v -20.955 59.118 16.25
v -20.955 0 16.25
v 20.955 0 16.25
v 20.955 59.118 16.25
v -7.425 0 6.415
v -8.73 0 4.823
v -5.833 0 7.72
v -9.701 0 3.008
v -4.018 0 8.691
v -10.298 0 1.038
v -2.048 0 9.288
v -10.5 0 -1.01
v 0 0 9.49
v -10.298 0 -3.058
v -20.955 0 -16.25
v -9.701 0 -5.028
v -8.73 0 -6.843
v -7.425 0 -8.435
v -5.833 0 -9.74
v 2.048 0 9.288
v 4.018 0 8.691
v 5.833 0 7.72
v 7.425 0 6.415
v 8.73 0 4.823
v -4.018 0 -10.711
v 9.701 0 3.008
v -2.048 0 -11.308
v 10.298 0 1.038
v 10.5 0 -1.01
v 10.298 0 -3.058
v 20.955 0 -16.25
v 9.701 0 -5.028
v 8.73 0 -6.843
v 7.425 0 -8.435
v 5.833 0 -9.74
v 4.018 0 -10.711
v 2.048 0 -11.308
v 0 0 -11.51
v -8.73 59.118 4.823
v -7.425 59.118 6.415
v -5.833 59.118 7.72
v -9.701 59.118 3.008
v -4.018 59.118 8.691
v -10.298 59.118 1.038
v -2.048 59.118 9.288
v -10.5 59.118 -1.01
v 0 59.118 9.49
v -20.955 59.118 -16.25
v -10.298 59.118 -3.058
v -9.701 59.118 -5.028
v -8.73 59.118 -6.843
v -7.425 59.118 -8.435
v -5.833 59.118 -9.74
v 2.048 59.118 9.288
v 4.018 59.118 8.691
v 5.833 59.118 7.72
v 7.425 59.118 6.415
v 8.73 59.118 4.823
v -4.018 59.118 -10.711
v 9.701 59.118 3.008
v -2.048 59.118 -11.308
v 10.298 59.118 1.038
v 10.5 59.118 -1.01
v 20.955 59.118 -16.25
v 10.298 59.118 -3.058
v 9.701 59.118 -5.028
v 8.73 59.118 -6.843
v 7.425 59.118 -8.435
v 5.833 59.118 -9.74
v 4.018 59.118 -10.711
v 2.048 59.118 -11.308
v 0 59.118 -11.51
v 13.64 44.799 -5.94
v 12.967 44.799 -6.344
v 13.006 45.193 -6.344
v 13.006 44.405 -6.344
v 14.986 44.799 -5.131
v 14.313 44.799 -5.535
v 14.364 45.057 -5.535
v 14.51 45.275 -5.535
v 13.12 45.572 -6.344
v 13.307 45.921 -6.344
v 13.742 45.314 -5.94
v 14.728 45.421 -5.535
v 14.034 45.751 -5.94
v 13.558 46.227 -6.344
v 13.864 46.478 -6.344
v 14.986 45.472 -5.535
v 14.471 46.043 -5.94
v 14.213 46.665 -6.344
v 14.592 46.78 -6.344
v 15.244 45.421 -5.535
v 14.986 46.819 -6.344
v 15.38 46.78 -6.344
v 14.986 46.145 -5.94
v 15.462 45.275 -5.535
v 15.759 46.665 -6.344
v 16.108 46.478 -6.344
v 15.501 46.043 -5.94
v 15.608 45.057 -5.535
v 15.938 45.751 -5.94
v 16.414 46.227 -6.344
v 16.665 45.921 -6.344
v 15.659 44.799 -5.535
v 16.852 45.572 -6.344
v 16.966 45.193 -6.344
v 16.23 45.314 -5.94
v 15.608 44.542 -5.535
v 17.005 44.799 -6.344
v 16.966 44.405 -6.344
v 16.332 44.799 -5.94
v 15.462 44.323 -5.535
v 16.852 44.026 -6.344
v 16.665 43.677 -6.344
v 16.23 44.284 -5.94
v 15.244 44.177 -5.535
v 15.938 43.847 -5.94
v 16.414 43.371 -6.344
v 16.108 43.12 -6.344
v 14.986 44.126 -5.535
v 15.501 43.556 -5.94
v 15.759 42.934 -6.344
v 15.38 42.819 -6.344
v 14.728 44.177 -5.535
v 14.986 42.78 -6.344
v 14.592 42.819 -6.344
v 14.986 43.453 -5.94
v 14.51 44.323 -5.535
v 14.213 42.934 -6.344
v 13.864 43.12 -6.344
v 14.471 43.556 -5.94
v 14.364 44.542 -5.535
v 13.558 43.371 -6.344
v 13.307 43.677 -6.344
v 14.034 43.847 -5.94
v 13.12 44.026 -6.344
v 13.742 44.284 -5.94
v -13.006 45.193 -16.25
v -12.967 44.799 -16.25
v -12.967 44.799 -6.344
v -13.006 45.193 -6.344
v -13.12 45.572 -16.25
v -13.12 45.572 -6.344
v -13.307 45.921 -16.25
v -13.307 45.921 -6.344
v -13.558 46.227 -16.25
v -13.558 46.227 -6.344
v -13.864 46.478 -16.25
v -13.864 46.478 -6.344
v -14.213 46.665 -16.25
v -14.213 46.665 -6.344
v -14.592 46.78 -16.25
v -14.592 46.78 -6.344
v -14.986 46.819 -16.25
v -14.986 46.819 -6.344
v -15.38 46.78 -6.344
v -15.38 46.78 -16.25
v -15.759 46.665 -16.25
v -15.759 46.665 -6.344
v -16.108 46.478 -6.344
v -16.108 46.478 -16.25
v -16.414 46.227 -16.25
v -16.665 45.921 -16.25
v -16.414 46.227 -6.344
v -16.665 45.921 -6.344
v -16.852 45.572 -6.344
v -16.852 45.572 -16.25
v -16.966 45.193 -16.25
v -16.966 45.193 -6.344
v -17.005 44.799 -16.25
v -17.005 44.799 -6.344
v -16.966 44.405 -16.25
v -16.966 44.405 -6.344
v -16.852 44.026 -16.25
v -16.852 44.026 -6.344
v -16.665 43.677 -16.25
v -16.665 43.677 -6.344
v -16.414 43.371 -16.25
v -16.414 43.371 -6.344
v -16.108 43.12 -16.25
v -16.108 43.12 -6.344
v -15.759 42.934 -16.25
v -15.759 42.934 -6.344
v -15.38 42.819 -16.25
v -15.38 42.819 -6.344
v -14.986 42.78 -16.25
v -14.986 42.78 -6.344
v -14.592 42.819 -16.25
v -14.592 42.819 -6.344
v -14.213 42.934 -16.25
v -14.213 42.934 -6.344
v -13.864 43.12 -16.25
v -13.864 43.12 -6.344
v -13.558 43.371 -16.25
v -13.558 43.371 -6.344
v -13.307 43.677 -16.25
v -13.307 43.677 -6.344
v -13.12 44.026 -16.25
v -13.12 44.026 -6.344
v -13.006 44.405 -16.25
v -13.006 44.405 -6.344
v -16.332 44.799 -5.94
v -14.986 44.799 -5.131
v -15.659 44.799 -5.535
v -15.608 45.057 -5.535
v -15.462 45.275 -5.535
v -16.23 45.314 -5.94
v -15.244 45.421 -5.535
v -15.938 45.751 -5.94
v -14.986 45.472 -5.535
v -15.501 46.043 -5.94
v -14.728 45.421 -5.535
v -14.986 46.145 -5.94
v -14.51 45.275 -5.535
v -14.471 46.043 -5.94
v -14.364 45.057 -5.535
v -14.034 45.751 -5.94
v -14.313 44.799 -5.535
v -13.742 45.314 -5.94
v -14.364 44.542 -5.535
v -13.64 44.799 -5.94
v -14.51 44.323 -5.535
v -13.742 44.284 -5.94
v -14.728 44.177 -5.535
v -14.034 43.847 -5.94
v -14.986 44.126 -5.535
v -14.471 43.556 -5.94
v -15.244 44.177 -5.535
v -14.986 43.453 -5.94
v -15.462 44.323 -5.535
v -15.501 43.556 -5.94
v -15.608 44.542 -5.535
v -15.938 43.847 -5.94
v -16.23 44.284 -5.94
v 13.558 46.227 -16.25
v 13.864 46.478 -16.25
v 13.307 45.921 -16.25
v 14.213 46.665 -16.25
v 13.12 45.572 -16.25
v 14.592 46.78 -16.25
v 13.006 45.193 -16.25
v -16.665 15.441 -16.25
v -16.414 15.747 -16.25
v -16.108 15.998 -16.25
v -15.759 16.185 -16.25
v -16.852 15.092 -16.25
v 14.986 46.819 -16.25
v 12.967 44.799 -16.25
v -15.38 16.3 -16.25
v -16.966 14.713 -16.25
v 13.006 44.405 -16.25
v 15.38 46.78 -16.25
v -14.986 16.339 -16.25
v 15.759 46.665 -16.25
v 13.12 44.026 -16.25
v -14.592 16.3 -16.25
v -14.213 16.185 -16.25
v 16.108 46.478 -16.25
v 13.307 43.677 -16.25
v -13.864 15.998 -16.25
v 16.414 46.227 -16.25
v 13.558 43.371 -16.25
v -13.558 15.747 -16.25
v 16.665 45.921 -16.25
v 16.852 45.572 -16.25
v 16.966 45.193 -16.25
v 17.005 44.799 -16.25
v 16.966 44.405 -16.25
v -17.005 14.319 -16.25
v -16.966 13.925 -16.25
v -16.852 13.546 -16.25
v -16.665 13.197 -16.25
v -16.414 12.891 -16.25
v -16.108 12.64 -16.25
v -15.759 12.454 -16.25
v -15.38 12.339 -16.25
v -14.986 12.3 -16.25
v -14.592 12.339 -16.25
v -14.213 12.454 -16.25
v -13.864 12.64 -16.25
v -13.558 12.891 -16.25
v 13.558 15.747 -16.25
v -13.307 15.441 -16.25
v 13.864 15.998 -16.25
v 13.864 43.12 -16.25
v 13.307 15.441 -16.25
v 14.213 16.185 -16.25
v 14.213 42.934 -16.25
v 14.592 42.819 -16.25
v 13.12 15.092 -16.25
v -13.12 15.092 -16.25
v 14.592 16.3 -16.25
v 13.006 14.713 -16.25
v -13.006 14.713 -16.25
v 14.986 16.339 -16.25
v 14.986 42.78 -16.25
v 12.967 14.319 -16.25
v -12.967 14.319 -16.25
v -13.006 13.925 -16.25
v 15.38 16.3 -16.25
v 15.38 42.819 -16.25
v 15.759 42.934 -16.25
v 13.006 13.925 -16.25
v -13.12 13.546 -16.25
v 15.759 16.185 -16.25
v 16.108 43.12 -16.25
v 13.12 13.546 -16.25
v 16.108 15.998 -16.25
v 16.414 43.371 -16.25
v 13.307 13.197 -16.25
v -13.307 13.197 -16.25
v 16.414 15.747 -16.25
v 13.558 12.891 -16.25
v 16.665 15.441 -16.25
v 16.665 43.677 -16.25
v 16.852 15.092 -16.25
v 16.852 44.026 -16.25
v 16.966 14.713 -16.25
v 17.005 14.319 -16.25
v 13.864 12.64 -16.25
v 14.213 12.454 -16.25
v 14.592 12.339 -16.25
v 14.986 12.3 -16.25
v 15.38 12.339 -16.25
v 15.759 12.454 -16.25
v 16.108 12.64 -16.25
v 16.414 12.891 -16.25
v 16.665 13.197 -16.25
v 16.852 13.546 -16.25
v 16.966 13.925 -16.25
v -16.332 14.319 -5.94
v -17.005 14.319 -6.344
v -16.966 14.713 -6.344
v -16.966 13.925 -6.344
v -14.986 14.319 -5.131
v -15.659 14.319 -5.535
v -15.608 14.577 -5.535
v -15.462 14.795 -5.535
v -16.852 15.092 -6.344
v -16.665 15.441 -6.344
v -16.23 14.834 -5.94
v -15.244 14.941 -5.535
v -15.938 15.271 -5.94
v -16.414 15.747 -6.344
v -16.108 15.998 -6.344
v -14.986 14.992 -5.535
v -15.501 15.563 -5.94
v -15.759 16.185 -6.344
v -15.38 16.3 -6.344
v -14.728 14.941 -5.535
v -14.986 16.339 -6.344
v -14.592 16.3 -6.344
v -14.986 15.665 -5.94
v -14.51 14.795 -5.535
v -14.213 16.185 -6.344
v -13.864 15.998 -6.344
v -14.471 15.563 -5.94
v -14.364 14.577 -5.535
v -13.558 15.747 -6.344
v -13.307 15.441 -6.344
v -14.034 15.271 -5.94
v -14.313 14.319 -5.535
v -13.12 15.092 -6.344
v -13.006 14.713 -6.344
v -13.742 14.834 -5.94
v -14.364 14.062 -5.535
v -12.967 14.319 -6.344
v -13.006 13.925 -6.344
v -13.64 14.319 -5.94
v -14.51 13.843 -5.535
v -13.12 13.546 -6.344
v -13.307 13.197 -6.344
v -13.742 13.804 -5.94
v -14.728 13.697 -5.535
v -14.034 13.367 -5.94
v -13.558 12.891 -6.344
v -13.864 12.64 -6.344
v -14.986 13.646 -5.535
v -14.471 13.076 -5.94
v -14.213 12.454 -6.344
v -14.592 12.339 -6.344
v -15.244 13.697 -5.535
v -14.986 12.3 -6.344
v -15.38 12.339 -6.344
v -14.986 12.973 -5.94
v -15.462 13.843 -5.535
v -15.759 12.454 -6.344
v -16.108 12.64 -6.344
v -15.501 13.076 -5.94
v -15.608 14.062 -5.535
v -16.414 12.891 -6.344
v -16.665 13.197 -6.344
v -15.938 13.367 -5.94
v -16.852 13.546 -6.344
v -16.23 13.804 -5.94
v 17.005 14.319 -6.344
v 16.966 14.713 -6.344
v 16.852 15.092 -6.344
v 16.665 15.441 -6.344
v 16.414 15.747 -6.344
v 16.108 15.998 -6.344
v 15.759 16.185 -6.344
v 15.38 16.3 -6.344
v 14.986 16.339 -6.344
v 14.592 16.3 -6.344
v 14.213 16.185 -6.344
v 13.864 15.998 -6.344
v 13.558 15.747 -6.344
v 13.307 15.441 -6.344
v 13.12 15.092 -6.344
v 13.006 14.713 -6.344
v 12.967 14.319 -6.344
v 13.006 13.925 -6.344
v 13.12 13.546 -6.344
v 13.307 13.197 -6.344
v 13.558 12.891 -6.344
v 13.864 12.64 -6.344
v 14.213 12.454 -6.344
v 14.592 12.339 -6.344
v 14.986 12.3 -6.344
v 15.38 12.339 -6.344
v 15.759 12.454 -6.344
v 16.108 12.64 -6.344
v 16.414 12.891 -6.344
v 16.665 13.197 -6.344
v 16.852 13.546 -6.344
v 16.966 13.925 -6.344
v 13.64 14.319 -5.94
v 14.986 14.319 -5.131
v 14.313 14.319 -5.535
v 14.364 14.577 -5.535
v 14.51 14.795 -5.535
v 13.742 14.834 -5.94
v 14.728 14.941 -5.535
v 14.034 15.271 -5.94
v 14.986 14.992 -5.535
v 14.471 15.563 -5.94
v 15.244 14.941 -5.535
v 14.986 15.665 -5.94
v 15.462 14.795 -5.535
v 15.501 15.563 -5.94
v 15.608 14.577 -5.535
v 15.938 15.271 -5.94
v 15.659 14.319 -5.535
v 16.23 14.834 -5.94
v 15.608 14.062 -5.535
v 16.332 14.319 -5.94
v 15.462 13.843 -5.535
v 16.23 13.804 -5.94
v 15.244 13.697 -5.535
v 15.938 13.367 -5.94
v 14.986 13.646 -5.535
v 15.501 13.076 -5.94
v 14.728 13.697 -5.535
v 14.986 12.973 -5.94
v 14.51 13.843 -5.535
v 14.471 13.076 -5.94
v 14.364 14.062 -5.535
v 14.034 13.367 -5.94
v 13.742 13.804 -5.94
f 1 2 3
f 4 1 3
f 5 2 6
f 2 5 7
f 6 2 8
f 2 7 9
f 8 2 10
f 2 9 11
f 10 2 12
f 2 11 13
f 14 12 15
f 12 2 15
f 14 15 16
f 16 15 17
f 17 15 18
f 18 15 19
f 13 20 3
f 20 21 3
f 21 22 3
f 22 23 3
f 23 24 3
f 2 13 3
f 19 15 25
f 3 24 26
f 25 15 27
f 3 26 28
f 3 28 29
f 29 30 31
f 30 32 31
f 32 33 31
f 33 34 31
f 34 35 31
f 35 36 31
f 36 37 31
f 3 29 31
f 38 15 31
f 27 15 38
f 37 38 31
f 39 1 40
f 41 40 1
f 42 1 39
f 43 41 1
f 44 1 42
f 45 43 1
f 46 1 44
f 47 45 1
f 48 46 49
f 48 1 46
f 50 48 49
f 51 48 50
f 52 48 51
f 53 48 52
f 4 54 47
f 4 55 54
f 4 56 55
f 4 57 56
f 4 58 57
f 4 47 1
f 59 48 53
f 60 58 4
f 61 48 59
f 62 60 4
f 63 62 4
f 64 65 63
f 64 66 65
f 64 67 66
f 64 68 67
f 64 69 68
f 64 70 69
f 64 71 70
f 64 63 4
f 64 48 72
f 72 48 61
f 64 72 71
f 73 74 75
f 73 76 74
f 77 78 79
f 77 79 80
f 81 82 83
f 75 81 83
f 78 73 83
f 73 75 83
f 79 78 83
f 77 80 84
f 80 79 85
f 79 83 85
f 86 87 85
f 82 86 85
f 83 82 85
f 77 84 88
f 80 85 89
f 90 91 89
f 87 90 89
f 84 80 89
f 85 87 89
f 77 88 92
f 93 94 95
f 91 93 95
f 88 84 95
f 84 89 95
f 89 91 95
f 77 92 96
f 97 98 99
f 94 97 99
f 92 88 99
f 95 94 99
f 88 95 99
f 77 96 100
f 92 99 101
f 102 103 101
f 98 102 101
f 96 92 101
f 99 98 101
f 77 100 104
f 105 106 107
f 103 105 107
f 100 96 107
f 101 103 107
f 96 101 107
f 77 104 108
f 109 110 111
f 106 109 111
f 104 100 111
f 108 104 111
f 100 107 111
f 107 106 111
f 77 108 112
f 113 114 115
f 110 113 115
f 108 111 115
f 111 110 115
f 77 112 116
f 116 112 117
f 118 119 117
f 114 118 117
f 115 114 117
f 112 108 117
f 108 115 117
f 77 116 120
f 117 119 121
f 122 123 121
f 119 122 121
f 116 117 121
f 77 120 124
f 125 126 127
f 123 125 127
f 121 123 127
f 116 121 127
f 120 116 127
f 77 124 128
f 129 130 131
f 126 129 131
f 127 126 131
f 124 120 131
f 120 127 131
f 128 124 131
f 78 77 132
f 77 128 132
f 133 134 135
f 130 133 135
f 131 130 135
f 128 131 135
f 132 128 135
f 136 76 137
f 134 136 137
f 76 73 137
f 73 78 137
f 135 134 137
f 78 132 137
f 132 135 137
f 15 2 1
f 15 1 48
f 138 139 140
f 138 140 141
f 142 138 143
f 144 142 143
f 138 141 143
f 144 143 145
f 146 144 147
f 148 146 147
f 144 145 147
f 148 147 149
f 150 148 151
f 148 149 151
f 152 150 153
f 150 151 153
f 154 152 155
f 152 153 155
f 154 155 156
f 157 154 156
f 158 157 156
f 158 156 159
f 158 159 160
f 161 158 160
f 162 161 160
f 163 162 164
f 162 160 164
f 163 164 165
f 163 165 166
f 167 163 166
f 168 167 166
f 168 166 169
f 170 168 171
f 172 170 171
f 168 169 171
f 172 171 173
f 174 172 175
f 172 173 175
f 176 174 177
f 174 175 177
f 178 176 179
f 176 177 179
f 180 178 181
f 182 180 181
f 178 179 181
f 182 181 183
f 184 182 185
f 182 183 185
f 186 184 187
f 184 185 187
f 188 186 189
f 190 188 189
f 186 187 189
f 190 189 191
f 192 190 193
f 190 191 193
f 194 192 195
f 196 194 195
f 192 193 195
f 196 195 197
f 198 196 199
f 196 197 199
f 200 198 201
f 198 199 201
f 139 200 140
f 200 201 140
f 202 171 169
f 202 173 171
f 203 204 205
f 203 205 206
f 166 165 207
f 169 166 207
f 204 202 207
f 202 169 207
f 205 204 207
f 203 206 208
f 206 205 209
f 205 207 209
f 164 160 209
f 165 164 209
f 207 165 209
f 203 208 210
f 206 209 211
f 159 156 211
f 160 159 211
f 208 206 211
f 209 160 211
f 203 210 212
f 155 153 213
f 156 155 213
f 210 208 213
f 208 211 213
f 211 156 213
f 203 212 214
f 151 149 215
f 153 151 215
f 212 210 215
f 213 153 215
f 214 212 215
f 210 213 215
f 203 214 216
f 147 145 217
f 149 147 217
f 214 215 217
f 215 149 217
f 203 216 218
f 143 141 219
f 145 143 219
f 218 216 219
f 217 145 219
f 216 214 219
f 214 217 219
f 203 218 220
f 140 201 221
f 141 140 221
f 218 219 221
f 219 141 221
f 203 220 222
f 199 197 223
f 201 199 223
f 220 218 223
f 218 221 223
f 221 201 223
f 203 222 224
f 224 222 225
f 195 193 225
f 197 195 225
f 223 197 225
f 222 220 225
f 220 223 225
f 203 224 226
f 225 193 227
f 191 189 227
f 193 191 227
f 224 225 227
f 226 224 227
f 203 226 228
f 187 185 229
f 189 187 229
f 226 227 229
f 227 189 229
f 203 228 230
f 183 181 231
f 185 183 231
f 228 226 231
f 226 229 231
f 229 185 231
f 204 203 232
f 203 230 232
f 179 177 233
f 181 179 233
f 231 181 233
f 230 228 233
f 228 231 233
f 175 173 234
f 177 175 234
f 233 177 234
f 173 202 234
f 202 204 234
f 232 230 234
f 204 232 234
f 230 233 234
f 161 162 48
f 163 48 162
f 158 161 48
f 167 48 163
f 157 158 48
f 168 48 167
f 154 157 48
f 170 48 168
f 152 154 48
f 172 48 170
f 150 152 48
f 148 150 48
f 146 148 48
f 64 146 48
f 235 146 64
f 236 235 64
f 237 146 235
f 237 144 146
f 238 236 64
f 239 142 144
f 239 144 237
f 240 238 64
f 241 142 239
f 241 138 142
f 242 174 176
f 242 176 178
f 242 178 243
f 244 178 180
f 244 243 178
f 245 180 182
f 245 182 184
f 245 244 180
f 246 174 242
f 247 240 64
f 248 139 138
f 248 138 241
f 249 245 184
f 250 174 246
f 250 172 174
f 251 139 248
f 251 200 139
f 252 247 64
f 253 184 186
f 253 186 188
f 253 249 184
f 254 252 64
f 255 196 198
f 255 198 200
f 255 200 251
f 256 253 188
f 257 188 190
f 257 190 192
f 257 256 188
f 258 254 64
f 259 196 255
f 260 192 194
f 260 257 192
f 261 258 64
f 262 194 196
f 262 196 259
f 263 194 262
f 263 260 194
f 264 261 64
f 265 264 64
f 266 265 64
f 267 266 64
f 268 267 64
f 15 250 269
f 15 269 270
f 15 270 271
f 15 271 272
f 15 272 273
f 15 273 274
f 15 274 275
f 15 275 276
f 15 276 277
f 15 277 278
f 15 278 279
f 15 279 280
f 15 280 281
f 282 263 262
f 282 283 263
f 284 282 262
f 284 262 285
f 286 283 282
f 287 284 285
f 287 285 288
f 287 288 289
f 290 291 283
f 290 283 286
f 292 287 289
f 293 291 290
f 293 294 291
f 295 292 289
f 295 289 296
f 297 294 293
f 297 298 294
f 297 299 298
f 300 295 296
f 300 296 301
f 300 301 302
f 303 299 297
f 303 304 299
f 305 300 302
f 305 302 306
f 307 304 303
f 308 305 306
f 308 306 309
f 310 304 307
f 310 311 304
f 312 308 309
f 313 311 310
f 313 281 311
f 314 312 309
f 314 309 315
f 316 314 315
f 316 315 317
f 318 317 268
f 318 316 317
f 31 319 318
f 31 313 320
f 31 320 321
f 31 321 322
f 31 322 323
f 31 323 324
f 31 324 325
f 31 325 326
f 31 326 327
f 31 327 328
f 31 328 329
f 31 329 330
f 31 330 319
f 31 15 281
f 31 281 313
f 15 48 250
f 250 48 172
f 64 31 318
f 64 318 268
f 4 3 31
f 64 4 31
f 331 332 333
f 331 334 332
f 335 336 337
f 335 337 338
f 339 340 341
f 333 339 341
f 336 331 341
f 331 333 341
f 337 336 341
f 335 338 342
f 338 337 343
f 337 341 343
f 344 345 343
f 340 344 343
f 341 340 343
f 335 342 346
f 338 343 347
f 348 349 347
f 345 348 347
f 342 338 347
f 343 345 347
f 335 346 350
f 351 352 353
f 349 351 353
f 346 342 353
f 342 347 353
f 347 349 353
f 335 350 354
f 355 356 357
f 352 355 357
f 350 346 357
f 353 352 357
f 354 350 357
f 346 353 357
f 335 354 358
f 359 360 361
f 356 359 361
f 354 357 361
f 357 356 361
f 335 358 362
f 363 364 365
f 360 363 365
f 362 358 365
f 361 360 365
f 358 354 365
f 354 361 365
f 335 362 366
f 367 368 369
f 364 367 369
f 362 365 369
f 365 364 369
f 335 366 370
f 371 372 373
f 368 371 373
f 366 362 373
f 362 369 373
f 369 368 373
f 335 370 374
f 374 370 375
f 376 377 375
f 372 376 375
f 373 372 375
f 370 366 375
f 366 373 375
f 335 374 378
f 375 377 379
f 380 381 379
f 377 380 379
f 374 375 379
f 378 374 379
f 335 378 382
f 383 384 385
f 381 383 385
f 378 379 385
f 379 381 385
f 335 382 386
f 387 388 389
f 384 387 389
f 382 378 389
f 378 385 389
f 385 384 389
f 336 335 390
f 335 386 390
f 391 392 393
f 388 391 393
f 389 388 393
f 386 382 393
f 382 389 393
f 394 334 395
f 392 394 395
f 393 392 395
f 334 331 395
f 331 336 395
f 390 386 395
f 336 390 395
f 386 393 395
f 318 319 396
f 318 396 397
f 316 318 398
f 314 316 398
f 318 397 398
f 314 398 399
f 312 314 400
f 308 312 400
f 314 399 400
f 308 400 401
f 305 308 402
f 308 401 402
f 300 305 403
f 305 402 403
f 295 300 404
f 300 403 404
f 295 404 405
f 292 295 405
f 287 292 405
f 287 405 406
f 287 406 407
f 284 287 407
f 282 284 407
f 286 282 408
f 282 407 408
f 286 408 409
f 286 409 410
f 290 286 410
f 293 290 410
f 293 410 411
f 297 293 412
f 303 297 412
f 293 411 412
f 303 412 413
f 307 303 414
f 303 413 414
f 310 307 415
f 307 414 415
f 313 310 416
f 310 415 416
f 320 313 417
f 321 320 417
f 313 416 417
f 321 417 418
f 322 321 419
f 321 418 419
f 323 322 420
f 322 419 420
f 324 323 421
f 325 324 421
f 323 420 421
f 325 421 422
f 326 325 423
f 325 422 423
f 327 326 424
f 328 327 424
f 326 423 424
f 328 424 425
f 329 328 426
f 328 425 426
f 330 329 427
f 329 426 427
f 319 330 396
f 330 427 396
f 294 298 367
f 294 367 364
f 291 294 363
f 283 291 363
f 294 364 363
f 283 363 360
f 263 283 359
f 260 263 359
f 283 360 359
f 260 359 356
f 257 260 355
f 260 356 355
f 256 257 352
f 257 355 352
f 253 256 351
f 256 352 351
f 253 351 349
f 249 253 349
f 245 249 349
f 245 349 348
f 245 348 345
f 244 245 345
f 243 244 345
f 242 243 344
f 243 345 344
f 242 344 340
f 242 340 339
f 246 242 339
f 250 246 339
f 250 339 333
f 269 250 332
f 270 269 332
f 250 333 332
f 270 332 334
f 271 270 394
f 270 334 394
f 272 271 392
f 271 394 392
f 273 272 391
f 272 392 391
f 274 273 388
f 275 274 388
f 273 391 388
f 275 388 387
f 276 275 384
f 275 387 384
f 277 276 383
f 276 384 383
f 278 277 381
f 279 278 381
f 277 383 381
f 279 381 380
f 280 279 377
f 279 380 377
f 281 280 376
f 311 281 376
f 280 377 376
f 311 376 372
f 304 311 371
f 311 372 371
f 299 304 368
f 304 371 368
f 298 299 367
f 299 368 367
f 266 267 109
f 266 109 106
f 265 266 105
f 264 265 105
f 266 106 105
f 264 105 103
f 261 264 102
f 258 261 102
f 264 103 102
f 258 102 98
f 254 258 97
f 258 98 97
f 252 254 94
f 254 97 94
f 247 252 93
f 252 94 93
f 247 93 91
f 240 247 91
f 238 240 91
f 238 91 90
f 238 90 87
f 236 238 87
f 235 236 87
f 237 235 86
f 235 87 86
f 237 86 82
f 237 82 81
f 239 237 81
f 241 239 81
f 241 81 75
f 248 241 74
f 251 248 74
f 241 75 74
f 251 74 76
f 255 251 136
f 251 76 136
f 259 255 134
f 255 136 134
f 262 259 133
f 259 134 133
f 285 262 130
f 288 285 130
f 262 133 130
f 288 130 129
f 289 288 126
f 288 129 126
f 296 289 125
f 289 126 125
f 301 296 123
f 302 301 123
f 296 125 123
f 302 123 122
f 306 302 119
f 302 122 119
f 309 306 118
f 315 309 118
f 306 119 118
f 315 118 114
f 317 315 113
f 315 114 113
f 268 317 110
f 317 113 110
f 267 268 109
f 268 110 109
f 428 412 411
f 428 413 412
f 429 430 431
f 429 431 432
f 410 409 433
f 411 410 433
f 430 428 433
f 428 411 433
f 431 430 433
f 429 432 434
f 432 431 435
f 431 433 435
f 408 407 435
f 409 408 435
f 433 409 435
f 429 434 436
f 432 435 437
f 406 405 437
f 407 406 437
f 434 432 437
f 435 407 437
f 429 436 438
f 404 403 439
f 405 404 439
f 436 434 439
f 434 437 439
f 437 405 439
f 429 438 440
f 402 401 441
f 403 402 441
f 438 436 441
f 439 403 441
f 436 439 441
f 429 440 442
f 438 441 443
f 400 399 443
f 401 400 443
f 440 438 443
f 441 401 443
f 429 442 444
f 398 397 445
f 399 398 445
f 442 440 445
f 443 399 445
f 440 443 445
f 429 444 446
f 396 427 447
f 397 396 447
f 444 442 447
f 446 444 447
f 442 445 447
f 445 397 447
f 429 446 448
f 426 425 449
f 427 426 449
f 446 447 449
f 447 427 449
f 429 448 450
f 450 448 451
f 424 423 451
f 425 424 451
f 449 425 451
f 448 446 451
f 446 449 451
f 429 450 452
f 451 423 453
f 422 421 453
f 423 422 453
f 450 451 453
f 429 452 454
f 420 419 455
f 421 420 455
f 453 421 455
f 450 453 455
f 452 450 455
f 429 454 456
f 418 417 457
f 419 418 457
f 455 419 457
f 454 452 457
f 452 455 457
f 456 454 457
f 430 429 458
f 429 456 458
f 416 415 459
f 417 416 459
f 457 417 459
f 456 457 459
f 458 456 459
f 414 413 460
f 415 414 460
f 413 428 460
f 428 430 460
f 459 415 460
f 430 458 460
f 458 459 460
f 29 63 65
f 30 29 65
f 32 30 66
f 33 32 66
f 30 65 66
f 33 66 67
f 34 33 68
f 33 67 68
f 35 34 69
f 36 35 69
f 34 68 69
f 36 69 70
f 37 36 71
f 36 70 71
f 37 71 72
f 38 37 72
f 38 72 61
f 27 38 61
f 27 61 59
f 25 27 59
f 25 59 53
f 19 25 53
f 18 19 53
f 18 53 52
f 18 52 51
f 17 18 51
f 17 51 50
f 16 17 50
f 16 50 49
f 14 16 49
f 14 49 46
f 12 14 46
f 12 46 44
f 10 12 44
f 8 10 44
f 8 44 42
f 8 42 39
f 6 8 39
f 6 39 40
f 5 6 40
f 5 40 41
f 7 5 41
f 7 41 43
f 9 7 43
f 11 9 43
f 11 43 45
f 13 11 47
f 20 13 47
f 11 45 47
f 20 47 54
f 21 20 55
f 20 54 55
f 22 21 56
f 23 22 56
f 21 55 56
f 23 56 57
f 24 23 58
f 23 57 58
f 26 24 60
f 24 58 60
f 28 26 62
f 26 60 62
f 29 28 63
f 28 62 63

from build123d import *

# Parameters (mm, degrees)
SKETCH1_W                  = 41.91
SKETCH1_H                  = 32.5
BOSS_EXTRUDE1_DEPTH        = 59.1185
SKETCH2_R                  = 10.5
CUT_EXTRUDE1_DEPTH         = 60.1185
F_10_32_TAPPED_HOLE1_D     = 4.0386
F_10_32_TAPPED_HOLE1_DEPTH = 9.906
F_10_32_TAPPED_HOLE1_TIP   = 1.213317848


with BuildPart() as part:
    # Sketch1 → Boss-Extrude1 (new body)
    with BuildSketch(Plane(origin=(0, 0, 0), x_dir=(1, 0, 0), z_dir=(0, 1, 0))):
        Rectangle(SKETCH1_W, SKETCH1_H)
    extrude(amount=BOSS_EXTRUDE1_DEPTH)

    # Sketch2 → Cut-Extrude1 (cut, through all)
    with BuildSketch(Plane(origin=(0, 59.1185, 0), x_dir=(1, 0, 0), z_dir=(0, 1, 0))):
        with Locations((0, 1.01)):
            Circle(SKETCH2_R)
    extrude(amount=-CUT_EXTRUDE1_DEPTH, mode=Mode.SUBTRACT)

    # #10-32 Tapped Hole1
    with Locations(Plane(origin=(0, 0, -16.25), x_dir=(-1, 0, 0), z_dir=(0, 0, -1))):
        with Locations((-14.986, 14.31925), (14.986, 14.31925), (14.986, 44.79925), (-14.986, 44.79925)):
            Hole(F_10_32_TAPPED_HOLE1_D / 2, depth=F_10_32_TAPPED_HOLE1_DEPTH)
            with Locations((0, 0, -(F_10_32_TAPPED_HOLE1_DEPTH + F_10_32_TAPPED_HOLE1_TIP / 2))):  # 118° drill point
                Cone(0, F_10_32_TAPPED_HOLE1_D / 2, F_10_32_TAPPED_HOLE1_TIP, mode=Mode.SUBTRACT)


solid = part.part
